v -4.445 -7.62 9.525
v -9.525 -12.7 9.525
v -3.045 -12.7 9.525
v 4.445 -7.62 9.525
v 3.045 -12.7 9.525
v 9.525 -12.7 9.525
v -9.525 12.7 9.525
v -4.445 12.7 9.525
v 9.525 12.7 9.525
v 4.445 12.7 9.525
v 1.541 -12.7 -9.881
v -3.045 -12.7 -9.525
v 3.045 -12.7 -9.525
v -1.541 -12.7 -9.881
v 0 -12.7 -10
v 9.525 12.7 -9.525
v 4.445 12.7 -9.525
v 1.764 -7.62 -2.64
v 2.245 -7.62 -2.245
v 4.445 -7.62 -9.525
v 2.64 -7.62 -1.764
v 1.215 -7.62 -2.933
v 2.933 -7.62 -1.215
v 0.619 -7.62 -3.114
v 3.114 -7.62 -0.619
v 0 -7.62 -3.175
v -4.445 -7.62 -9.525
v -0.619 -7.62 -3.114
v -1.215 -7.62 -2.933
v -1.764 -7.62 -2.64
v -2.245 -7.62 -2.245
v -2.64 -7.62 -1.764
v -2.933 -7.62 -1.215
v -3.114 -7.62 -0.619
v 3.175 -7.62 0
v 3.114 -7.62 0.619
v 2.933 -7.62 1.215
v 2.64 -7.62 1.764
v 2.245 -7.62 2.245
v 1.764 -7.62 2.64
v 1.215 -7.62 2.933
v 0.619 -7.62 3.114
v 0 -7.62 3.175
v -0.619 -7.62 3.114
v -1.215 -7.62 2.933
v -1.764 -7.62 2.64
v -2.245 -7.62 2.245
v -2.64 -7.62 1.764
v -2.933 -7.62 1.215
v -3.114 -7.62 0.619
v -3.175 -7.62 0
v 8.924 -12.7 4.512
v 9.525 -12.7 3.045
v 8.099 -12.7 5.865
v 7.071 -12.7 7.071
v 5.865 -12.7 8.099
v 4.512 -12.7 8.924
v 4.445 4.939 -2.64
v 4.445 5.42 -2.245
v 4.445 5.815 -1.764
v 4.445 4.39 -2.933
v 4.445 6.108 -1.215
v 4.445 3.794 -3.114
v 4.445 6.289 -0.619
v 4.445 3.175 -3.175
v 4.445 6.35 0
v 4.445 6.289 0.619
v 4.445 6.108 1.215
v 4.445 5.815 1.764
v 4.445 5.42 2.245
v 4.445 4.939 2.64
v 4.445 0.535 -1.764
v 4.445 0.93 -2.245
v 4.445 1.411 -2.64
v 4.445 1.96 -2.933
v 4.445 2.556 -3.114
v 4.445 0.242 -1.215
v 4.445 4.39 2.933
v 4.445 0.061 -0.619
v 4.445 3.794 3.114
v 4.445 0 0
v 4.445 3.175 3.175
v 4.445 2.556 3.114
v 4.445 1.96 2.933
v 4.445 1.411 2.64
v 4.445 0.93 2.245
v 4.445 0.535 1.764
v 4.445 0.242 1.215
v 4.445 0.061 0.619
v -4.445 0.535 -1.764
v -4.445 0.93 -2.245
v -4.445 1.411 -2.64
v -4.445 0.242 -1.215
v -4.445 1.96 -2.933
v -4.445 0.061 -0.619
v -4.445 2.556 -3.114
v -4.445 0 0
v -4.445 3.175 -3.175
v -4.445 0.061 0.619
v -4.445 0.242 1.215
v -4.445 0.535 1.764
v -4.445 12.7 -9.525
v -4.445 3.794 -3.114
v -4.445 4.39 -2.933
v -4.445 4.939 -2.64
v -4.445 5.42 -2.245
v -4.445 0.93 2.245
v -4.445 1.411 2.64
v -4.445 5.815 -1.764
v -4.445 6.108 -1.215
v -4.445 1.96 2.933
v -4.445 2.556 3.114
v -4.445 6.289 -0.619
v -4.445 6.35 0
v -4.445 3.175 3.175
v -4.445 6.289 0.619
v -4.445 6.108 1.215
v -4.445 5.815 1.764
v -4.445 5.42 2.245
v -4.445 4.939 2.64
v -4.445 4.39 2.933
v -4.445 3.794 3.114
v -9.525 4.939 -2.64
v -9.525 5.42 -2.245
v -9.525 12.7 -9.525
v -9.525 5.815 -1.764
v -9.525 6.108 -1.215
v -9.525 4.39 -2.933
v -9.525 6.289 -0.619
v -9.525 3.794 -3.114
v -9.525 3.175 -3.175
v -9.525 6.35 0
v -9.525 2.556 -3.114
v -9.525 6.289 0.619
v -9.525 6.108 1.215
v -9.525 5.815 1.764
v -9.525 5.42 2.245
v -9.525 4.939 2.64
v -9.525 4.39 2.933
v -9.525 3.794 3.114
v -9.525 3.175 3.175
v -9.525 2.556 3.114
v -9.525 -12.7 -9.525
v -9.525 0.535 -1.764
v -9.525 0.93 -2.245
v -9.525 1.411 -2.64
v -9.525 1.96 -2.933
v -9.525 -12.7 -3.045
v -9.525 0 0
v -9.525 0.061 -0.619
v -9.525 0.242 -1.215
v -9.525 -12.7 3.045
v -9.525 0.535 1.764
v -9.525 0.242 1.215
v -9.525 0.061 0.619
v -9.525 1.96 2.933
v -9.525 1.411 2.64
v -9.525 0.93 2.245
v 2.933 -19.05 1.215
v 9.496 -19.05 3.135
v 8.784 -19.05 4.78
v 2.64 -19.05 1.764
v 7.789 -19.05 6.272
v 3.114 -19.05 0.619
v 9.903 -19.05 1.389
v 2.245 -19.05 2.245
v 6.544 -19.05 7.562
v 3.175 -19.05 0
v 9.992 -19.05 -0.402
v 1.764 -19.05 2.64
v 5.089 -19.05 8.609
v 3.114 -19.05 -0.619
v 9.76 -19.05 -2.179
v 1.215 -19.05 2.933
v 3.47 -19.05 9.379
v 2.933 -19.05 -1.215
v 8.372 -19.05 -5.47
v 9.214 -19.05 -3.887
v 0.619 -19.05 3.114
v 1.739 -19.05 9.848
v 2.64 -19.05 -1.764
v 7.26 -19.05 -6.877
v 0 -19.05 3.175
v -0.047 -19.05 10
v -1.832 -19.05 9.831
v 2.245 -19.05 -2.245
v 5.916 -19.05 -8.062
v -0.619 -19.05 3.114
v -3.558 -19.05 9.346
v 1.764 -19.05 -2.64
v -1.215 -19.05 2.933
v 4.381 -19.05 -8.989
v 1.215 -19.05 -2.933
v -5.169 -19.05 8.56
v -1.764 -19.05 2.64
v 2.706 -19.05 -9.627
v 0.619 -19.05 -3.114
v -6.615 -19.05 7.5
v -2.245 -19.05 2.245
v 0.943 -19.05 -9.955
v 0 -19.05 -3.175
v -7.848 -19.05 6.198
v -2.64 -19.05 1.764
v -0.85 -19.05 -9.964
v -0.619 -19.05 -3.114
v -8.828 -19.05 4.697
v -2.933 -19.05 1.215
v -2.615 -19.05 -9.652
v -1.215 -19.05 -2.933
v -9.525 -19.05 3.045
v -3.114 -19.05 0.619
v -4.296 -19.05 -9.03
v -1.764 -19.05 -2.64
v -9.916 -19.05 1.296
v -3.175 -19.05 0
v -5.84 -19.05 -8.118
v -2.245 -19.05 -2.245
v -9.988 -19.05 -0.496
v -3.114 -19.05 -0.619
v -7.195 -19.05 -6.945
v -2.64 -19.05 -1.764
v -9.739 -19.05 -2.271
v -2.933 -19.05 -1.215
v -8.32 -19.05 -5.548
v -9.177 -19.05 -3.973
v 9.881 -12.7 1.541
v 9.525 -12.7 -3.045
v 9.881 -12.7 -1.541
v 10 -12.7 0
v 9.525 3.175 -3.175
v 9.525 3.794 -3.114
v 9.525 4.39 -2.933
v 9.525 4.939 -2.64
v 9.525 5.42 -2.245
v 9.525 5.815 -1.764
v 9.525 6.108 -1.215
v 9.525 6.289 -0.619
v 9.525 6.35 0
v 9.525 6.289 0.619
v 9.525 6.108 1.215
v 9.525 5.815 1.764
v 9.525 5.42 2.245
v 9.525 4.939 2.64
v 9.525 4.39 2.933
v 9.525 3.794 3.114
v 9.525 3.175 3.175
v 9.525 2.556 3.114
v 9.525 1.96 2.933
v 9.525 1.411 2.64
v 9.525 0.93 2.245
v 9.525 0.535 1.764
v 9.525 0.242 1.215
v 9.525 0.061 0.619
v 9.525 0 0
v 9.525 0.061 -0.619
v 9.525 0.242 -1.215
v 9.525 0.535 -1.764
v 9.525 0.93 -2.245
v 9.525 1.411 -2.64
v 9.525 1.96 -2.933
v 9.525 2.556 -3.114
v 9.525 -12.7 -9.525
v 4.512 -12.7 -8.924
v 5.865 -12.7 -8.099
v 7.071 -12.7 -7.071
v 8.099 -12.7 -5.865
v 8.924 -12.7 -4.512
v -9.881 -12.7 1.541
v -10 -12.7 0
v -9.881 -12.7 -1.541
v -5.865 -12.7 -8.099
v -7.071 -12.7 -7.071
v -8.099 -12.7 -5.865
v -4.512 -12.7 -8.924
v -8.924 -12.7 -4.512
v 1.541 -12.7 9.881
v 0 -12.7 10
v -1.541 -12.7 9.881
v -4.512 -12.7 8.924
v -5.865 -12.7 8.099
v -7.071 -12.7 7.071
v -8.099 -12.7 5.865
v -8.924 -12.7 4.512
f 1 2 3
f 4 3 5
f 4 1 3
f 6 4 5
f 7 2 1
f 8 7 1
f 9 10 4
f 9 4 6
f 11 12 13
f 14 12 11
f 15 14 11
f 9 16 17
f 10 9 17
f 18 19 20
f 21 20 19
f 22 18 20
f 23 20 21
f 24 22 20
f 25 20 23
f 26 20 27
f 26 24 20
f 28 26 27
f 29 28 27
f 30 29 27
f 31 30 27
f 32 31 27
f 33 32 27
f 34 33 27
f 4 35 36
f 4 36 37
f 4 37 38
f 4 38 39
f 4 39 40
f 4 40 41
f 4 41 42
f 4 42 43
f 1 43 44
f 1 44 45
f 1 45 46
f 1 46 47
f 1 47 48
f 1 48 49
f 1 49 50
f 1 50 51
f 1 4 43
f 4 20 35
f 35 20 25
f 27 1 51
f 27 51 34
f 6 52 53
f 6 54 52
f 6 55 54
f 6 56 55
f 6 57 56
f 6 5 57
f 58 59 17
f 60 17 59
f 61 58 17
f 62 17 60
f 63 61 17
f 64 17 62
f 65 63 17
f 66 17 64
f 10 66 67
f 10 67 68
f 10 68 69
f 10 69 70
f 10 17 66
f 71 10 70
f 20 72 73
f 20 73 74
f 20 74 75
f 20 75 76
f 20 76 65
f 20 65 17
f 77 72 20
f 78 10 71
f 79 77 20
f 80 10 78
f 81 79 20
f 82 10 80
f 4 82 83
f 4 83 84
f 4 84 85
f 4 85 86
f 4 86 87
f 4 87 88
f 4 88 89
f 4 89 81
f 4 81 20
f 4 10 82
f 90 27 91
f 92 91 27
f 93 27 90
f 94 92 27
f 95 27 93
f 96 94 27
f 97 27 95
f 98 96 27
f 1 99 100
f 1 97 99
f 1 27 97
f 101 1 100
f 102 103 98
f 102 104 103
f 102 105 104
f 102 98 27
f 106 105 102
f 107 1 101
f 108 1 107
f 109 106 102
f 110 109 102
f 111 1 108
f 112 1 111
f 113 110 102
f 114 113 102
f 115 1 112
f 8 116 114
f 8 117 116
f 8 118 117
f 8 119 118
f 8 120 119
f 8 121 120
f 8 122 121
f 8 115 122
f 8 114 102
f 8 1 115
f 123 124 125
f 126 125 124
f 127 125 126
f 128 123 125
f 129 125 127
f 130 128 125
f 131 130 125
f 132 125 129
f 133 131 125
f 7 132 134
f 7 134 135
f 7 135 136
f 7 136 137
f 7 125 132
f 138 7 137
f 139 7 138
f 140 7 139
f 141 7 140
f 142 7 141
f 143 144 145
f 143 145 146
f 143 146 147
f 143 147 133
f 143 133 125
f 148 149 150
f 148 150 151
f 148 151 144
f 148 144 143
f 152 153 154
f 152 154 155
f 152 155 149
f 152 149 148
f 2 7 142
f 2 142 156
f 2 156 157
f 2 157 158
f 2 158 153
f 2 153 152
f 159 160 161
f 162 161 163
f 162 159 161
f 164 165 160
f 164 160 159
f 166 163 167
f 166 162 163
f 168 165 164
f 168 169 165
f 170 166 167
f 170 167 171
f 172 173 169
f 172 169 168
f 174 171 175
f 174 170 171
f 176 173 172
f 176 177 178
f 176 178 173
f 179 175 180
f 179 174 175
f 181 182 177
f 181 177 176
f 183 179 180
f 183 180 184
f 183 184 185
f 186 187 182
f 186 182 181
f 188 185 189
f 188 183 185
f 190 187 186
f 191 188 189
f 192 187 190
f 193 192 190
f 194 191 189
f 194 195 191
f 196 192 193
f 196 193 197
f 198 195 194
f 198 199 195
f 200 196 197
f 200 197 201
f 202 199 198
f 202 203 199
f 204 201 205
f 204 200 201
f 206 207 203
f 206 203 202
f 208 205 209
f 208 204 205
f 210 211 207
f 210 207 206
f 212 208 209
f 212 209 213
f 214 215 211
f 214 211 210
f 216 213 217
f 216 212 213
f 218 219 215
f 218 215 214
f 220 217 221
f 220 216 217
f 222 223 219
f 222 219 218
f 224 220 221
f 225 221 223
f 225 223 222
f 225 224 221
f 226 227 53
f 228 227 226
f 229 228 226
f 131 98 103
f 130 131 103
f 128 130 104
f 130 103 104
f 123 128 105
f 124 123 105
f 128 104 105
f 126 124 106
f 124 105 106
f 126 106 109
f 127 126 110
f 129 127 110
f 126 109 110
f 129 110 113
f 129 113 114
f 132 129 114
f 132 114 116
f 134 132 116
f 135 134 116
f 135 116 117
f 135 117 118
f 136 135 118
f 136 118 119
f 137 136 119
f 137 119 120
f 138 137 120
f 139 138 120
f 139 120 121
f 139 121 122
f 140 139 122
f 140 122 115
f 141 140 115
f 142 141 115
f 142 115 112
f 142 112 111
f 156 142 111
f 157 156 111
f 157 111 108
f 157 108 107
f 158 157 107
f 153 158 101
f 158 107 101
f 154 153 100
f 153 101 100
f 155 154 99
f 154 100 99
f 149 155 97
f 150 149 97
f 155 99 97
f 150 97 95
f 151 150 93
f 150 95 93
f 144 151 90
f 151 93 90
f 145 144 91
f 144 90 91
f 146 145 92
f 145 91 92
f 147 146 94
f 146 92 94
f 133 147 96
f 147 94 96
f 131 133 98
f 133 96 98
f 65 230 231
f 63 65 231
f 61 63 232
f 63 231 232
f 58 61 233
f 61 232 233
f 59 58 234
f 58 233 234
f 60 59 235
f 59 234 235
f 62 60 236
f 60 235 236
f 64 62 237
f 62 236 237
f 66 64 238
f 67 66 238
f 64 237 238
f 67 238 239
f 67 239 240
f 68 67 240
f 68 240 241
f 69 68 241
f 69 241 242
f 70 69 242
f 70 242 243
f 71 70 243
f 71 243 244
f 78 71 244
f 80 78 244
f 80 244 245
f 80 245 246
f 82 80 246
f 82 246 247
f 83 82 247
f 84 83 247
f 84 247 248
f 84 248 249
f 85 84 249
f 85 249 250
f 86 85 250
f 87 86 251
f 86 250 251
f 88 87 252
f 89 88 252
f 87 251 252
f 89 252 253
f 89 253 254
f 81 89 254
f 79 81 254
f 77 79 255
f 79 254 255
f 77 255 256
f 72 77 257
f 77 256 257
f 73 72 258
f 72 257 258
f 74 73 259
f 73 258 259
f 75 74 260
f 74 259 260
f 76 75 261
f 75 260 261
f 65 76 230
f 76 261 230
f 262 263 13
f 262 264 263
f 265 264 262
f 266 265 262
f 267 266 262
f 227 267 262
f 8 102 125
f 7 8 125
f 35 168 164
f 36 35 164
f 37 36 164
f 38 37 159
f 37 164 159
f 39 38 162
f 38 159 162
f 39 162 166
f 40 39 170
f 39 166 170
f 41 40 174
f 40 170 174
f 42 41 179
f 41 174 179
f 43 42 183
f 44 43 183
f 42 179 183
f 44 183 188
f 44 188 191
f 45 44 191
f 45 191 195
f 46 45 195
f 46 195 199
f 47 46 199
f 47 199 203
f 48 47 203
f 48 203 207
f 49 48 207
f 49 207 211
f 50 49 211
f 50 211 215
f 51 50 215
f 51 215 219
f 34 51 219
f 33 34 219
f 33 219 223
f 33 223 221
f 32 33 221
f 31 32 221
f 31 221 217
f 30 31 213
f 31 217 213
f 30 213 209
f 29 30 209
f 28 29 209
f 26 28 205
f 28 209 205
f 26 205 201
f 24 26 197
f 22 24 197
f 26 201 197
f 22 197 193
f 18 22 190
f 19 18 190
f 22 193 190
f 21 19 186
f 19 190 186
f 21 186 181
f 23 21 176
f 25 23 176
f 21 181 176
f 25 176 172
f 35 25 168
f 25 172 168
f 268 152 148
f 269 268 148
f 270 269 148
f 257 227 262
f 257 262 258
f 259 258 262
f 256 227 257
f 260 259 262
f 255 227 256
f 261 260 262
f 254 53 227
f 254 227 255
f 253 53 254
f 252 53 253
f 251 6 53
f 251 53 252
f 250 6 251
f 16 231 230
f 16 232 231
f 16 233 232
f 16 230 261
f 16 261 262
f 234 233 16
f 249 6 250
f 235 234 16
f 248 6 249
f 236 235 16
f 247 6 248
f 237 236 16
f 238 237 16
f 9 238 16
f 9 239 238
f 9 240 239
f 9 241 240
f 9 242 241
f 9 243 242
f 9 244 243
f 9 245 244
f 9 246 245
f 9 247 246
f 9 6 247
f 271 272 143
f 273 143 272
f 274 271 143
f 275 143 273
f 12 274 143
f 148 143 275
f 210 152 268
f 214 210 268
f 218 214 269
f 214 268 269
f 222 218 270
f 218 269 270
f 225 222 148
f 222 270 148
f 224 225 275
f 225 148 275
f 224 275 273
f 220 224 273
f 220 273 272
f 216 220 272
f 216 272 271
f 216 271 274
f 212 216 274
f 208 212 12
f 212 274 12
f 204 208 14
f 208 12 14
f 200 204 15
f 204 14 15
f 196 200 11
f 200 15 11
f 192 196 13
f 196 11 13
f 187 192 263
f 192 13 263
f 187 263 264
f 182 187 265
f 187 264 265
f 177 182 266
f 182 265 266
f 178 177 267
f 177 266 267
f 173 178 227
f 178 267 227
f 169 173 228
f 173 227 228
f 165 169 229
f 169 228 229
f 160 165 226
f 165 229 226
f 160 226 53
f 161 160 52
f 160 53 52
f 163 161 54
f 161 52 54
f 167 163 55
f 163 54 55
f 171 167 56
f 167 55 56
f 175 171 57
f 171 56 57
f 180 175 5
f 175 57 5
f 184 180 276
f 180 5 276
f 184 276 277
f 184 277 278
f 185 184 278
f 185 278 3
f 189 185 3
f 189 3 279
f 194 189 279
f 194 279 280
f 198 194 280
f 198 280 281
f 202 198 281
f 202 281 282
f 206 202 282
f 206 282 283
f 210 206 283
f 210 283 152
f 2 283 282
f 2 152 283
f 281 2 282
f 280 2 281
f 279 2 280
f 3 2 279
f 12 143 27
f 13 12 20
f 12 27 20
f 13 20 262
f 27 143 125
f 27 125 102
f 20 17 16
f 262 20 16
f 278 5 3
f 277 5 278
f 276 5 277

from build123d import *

# Parameters (mm, degrees)
BOSS_EXTRUDE1_DEPTH = 9.525
SKETCH2_R           = 10
BOSS_EXTRUDE2_DEPTH = 6.35
CUT_EXTRUDE1_REACH  = 36.757
SKETCH3_R           = 3.175
SKETCH4_R           = 3.175
CUT_EXTRUDE2_DEPTH  = 30.053883131


with BuildPart() as part:
    # Sketch1 → Boss-Extrude1 (new, symmetric)
    with BuildSketch(Plane.XY):
        Polygon((-9.525, 12.7), (-9.525, -12.7), (9.525, -12.7), (9.525, 12.7), (4.445, 12.7), (4.445, -7.62), (-4.445, -7.62), (-4.445, 12.7), align=None)
    extrude(amount=BOSS_EXTRUDE1_DEPTH, both=True)

    # Sketch2 → Boss-Extrude2 (add)
    with BuildSketch(Plane.XZ.offset(12.7)):
        Circle(SKETCH2_R)
    extrude(amount=BOSS_EXTRUDE2_DEPTH)

    # Sketch3 → Cut-Extrude1 (cut, up to next)
    with BuildSketch(Plane.XZ.offset(19.05), mode=Mode.PRIVATE) as cut_extrude1_sk1:
        Circle(SKETCH3_R)
    cut_extrude1_tool1 = extrude(cut_extrude1_sk1.sketch, amount=-CUT_EXTRUDE1_REACH, mode=Mode.PRIVATE) & part.part
    add(cut_extrude1_tool1.solids().sort_by_distance((0, -19.05, 0))[0], mode=Mode.SUBTRACT)

    # Sketch4 → Cut-Extrude2 (cut, through all)
    with BuildSketch(Plane(origin=(9.525, 0, 0), x_dir=(0, 0, -1), z_dir=(1, 0, 0))):
        with Locations((0, 3.175)):
            Circle(SKETCH4_R)
    extrude(amount=-CUT_EXTRUDE2_DEPTH, mode=Mode.SUBTRACT)


solid = part.part
